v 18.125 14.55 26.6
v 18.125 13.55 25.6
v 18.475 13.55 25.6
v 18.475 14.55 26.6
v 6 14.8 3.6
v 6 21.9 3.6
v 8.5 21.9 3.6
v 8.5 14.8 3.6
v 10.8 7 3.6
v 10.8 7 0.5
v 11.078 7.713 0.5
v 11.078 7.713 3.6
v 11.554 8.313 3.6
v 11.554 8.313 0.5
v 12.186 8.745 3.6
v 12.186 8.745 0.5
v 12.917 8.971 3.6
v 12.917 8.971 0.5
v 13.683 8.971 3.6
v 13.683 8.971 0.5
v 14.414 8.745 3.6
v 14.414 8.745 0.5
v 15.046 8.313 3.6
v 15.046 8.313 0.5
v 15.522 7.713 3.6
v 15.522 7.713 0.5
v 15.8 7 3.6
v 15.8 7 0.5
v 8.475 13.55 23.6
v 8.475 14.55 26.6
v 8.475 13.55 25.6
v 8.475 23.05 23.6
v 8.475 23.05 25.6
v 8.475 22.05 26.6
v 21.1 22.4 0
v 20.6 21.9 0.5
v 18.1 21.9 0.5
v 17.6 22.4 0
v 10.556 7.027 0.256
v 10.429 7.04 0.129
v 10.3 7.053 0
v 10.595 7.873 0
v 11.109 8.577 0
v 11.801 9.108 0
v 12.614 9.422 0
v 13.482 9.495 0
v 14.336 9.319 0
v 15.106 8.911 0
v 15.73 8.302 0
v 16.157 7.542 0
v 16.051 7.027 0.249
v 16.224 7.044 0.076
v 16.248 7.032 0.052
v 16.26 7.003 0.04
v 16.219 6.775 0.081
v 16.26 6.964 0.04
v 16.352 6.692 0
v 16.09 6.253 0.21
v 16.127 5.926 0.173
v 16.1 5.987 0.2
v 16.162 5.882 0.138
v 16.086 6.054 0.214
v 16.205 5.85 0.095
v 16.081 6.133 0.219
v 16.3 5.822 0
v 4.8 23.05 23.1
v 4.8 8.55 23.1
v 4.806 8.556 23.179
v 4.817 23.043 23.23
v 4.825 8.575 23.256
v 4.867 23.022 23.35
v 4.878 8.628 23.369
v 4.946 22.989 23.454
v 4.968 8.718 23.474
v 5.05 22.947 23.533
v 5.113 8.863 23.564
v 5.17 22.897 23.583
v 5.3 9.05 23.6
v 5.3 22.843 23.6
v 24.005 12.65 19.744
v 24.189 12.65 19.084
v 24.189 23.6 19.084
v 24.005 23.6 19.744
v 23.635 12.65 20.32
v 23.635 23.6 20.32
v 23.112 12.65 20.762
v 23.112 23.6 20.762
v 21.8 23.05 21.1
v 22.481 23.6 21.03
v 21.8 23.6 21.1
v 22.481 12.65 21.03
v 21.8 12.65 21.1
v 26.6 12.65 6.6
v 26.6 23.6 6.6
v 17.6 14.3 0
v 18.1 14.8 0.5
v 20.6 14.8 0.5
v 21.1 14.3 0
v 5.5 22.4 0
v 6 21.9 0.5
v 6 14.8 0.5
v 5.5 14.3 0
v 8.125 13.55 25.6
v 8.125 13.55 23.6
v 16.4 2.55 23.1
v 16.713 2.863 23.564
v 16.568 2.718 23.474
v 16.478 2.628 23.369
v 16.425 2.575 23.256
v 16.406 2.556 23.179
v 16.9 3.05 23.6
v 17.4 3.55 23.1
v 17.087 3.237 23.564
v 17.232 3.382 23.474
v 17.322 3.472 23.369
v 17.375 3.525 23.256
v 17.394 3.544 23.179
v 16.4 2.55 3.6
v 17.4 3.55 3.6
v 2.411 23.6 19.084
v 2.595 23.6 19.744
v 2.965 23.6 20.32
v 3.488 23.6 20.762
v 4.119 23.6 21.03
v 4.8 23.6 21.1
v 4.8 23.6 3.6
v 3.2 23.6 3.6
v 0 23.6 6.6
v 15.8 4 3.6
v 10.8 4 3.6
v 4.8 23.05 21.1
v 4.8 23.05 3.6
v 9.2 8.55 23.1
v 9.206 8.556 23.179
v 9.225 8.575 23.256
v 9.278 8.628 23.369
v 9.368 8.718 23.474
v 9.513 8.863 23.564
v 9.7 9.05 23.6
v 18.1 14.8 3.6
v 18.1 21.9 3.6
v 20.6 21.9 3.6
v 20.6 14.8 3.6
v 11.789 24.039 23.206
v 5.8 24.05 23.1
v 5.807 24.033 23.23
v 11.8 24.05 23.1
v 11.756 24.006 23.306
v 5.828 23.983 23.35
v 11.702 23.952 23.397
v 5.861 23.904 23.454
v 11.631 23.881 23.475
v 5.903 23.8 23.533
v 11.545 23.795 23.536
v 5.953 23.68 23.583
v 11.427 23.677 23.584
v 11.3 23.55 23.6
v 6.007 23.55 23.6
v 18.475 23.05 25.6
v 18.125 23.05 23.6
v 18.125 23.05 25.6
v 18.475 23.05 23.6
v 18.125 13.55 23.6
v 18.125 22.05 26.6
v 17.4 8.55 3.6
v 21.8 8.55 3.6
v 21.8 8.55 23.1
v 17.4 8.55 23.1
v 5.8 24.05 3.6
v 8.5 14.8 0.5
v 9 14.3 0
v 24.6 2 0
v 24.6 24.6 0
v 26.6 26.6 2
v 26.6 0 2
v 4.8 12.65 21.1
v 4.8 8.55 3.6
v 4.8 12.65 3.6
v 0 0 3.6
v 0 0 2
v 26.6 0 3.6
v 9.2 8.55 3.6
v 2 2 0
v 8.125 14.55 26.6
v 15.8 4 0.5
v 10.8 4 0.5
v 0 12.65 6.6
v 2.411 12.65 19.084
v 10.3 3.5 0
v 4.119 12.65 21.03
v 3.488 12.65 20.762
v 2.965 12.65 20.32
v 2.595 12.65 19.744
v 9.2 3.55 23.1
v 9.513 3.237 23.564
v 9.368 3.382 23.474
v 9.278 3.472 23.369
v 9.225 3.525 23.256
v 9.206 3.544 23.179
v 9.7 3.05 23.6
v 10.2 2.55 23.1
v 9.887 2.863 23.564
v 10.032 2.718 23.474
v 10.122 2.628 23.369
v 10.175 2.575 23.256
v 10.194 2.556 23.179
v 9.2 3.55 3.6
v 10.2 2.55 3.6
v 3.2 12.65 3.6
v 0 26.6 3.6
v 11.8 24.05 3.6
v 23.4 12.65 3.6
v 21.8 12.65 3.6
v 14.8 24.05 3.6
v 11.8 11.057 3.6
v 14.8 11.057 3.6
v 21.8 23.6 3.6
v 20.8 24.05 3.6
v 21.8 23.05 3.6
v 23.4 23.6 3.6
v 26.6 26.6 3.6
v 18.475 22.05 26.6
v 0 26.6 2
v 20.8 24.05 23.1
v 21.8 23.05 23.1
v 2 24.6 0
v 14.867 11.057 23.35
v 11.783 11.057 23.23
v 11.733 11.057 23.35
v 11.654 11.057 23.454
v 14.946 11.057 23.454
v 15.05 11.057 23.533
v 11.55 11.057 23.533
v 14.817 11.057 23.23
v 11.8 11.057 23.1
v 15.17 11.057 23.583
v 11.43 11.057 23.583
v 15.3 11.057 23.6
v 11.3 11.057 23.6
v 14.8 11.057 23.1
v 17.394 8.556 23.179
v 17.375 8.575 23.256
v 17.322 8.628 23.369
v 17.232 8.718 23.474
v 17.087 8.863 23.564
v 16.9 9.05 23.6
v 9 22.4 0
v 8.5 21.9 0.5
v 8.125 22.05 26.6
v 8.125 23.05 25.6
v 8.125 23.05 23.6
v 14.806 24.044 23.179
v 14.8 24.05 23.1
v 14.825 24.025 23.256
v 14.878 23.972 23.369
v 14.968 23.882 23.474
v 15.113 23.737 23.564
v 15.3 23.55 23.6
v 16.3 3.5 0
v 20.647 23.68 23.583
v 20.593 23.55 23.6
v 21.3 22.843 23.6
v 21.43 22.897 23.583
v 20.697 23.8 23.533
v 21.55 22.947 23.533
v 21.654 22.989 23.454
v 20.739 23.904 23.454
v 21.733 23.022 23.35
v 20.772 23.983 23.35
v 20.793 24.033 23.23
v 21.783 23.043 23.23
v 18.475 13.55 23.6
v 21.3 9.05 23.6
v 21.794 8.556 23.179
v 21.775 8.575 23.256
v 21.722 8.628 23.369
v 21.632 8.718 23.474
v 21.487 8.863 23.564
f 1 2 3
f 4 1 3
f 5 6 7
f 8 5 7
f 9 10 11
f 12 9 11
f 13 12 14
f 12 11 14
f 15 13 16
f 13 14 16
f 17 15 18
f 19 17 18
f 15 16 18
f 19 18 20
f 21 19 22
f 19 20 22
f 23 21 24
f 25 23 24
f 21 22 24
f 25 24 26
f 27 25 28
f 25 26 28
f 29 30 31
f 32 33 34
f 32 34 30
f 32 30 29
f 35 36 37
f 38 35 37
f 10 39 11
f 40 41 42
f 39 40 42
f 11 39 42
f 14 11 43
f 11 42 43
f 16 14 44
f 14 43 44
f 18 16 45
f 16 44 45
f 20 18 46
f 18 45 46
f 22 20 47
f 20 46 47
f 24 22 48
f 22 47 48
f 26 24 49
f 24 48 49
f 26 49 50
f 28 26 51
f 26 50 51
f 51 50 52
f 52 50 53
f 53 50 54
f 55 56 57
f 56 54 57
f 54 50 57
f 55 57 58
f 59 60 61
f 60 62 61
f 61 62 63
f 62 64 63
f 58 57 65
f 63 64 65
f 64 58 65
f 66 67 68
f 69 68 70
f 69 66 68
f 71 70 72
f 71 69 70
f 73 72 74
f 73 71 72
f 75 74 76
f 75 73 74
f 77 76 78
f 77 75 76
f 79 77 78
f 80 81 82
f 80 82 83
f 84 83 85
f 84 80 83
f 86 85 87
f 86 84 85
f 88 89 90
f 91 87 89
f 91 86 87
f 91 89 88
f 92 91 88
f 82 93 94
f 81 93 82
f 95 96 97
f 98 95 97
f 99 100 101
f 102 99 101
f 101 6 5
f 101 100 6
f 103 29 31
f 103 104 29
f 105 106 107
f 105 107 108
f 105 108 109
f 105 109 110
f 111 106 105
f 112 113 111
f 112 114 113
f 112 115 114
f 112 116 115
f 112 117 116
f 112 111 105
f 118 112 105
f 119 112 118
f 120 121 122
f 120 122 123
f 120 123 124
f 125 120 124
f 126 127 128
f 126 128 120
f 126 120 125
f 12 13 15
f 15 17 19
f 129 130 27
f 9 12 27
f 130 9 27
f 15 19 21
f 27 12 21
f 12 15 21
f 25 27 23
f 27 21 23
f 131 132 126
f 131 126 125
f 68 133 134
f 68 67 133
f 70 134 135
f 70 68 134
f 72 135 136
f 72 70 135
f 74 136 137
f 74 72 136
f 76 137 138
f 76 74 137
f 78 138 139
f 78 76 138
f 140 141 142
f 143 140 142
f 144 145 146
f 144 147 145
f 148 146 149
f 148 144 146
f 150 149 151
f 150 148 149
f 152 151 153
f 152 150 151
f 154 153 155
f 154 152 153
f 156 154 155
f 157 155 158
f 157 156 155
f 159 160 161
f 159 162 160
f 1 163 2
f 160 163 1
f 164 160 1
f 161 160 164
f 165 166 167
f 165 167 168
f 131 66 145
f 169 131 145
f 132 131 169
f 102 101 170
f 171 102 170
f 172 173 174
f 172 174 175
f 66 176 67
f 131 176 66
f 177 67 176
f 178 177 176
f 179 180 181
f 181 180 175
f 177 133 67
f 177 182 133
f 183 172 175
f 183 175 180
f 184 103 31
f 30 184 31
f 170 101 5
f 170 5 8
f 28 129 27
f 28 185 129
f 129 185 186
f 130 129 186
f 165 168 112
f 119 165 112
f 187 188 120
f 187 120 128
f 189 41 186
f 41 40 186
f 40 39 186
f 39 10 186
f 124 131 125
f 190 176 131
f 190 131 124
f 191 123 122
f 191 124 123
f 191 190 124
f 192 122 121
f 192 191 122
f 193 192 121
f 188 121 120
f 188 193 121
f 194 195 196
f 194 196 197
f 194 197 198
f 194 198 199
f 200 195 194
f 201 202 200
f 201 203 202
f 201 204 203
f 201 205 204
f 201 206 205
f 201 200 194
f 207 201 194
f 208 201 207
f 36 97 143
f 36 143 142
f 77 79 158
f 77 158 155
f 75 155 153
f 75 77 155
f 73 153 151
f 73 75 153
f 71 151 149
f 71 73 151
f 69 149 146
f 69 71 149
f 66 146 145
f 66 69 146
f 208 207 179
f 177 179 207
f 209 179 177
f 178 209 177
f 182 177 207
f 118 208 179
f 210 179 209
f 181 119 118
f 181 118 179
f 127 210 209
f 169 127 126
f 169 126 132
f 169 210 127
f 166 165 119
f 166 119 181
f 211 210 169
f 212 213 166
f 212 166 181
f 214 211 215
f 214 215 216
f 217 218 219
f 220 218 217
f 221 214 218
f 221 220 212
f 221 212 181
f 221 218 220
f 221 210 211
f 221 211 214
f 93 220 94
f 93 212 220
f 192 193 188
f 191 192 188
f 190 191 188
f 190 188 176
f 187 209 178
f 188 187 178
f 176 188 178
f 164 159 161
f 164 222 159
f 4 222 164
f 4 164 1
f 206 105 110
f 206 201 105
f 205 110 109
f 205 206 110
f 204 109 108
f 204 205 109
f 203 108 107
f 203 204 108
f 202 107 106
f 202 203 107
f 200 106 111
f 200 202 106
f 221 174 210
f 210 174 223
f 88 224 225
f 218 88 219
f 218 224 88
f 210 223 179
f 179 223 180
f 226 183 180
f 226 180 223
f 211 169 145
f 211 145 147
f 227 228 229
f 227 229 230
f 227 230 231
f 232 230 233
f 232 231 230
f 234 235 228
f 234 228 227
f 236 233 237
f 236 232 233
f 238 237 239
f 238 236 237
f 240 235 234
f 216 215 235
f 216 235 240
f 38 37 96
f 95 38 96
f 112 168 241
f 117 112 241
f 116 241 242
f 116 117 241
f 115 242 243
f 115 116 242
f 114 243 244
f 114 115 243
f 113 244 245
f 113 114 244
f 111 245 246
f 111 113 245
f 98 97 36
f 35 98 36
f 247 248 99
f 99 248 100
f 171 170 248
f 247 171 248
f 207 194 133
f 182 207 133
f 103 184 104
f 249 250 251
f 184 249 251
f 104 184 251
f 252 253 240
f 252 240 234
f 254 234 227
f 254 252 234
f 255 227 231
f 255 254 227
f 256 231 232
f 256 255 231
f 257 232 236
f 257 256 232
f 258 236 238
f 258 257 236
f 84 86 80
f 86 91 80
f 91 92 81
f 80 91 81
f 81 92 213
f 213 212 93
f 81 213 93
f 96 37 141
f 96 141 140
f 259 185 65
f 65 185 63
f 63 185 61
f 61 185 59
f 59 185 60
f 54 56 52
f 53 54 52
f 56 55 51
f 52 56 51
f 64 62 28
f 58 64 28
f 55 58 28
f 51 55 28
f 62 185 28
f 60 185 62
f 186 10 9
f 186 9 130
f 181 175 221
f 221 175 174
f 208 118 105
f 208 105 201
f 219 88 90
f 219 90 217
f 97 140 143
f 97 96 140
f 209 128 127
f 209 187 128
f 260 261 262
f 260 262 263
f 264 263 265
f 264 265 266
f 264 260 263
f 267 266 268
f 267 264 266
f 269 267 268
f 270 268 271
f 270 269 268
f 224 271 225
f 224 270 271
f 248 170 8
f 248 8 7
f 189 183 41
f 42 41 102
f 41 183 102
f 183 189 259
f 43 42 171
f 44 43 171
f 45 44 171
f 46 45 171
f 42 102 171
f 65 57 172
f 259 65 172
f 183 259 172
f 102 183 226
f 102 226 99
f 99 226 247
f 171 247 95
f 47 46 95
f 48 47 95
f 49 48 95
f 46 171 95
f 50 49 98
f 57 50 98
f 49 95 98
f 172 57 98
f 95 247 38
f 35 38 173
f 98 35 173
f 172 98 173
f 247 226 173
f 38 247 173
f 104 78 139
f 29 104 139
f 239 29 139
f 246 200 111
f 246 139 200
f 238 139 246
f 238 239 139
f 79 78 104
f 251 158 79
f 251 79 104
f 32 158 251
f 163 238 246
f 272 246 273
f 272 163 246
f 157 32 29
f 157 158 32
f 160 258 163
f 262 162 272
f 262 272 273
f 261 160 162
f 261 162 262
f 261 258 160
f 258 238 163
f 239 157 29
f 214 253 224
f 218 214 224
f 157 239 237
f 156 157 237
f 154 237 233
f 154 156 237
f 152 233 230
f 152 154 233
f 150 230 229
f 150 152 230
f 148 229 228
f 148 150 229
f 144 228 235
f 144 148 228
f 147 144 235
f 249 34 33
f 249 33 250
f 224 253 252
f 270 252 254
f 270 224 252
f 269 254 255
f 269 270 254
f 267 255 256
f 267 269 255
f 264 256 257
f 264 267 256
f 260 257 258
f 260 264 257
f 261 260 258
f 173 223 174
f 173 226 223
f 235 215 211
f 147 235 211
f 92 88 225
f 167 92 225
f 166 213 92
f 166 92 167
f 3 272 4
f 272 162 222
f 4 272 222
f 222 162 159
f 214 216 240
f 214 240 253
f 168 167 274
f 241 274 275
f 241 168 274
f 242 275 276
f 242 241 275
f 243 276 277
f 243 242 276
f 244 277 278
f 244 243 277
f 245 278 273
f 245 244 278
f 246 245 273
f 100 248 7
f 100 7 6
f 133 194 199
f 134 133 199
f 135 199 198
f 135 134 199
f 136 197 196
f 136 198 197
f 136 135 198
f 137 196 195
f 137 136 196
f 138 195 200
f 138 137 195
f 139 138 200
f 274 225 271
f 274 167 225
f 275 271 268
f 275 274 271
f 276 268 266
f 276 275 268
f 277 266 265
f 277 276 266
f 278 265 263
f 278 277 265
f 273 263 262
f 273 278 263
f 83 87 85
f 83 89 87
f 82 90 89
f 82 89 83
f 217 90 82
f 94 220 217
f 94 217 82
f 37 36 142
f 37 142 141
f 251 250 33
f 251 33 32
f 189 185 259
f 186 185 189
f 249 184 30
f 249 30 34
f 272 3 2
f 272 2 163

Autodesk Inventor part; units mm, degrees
ref_plane "XYPlane" through (14.8, 16.3, 3.6) normal (0, 1, 0) x (1, 0, 0)
ref_plane "YZPlane" through (13.3, 11.0574, 3.6) normal (-1, 0, 0) x (0, 0, 1)
sketch "Sketch1" plane through (0, 0, 0) normal (0, 0, 1) x (1, 0, 0)
  line L0 (0, 0) -> (26.6, 0)
  line L1 (26.6, 0) -> (26.6, 26.6)
  line L2 (26.6, 26.6) -> (0, 26.6)
  line L3 (0, 26.6) -> (0, 0)
  dimension "d0" = 26.6
  dimension "d1" = 26.6
extrude "Extrusion1" add sketch "Sketch1" along normal blind 3.6
chamfer "Chamfer1" distance 2 angle 45 4 edges at (13.3, 26.6, 0) (0, 13.3, 0) (26.6, 13.3, 0) (13.3, 0, 0)
sketch "Sketch2" plane through (0, 0, 0) normal (0, 0, -1) x (-1, 0, 0)
  line L0 (0, 26.6) -> (0, 0) construction
  line L1 (0, 20.5614) -> (-6, 20.5614) construction
  line L2 (-26.6, 26.6) -> (0, 26.6) construction
  line L3 (-7.1317, 26.6) -> (-7.1317, 21.9) construction
  line L4 (-7.1317, 26.6) -> (-2.4317, 26.6) construction
  line L5 (-6, 21.9) -> (-8.5, 21.9) construction
  line L6 (-8.5, 21.9) -> (-8.5, 14.8) construction
  line L7 (-8.5, 14.8) -> (-6, 14.8) construction
  line L8 (-6, 14.8) -> (-6, 21.9) construction
  line L9 (-13.3, 26.6) -> (-13.3, 0) construction
  line L10 (0, 0) -> (-26.6, 0) construction
  line L11 (-20.6, 21.9) -> (-18.1, 21.9) construction
  line L12 (-18.1, 21.9) -> (-18.1, 14.8) construction
  line L13 (-18.1, 14.8) -> (-20.6, 14.8) construction
  line L14 (-20.6, 14.8) -> (-20.6, 21.9) construction
  line L15 (-13.3, 0) -> (-13.3, 4) construction
  line L16 (-13.3, 4) -> (-10.8, 4) construction
  line L17 (-10.8, 4) -> (-15.8, 4) construction
  line L18 (-15.8, 4) -> (-15.8, 9) construction
  line L19 (-15.8, 9) -> (-10.8, 9) construction
  line L20 (-10.8, 9) -> (-10.8, 4) construction
  line L21 (-15.8, 4) -> (-15.8, 7) construction
  line L22 (-10.8, 4) -> (-10.8, 7) construction
  arc A0 (-10.8, 7) -> (-15.8, 7) centre (-13.3, 6.4375) ccw construction
  line L23 (-20.6, 21.9) -> (-18.1, 21.9)
  line L24 (-18.1, 21.9) -> (-18.1, 14.8)
  line L25 (-18.1, 14.8) -> (-20.6, 14.8)
  line L26 (-20.6, 14.8) -> (-20.6, 21.9)
  line L27 (-8.5, 21.9) -> (-6, 21.9)
  line L28 (-6, 21.9) -> (-6, 14.8)
  line L29 (-6, 14.8) -> (-8.5, 14.8)
  line L30 (-8.5, 14.8) -> (-8.5, 21.9)
  line L31 (-15.8, 4) -> (-10.8, 4)
  line L32 (-10.8, 7) -> (-10.8, 4)
  line L33 (-15.8, 4) -> (-15.8, 7)
  arc A1 (-10.8, 7) -> (-15.8, 7) centre (-13.3, 6.4375) ccw
  dimension "d7" = 6
  dimension "d9" = 4.7
  dimension "d11" = 2.5
  dimension "d12" = 7.1
  dimension "d13" = 4
  dimension "d14" = 2.5
  dimension "d15" = 5
  dimension "d16" = 5
  dimension "d17" = 3
extrude "Extrusion2" cut sketch "Sketch2" against normal blind 3.6
sketch "Sketch3" plane through (0, 0, 3.6) normal (0, 0, 1) x (1, 0, 0)
  line L0 (15.8, 4) -> (10.8, 4) construction
  line L1 (10.8, 4) -> (10.8, 7) construction
  arc A0 (15.8, 7) -> (10.8, 7) centre (13.3, 6.4375) ccw construction
  line L2 (15.8, 7) -> (15.8, 4) construction
  line L3 (6, 14.8) -> (6, 21.9) construction
  line L4 (6, 21.9) -> (8.5, 21.9) construction
  line L5 (8.5, 21.9) -> (8.5, 14.8) construction
  line L6 (8.5, 14.8) -> (6, 14.8) construction
  line L7 (18.1, 14.8) -> (18.1, 21.9) construction
  line L8 (18.1, 21.9) -> (20.6, 21.9) construction
  line L9 (20.6, 21.9) -> (20.6, 14.8) construction
  line L10 (20.6, 14.8) -> (18.1, 14.8) construction
  line L11 (26.6, 0) -> (26.6, 26.6) construction
  line L12 (26.6, 26.6) -> (0, 26.6) construction
  line L13 (0, 26.6) -> (0, 0) construction
  line L14 (0, 0) -> (26.6, 0) construction
  line L15 (13.3, 26.6) -> (13.3, 0) construction
  line L16 (4.8, 2.55) -> (21.8, 2.55) construction
  line L17 (21.8, 2.55) -> (21.8, 24.05) construction
  line L18 (21.8, 24.05) -> (4.8, 24.05) construction
  line L19 (4.8, 24.05) -> (4.8, 2.55) construction
  line L20 (4.8, 2.55) -> (21.8, 24.05) construction
  line L21 (21.8, 2.55) -> (4.8, 24.05) construction
  line L22 (21.8, 2.55) -> (17.4, 2.55) construction
  line L23 (17.4, 2.55) -> (17.4, 8.55) construction
  line L24 (17.4, 8.55) -> (21.8, 8.55) construction
  line L25 (21.8, 8.55) -> (21.8, 2.55) construction
  line L26 (4.8, 2.55) -> (9.2, 2.55) construction
  line L27 (9.2, 2.55) -> (9.2, 8.55) construction
  line L28 (9.2, 8.55) -> (4.8, 8.55) construction
  line L29 (4.8, 8.55) -> (4.8, 2.55) construction
  line L30 (11.8, 37.0426) -> (14.8, 37.0426) construction
  line L31 (14.8, 37.0426) -> (14.8, 11.0574) construction
  line L32 (14.8, 11.0574) -> (11.8, 11.0574) construction
  line L33 (11.8, 11.0574) -> (11.8, 37.0426) construction
  line L34 (11.8, 37.0426) -> (14.8, 11.0574) construction
  line L35 (14.8, 37.0426) -> (11.8, 11.0574) construction
  line L36 (4.8, 24.05) -> (11.8, 24.05)
  line L37 (11.8, 11.0574) -> (11.8, 24.05)
  line L38 (11.8, 11.0574) -> (14.8, 11.0574)
  line L39 (14.8, 11.0574) -> (14.8, 24.05)
  line L40 (14.8, 24.05) -> (21.8, 24.05)
  line L41 (21.8, 24.05) -> (21.8, 8.55)
  line L42 (21.8, 8.55) -> (17.4, 8.55)
  line L43 (17.4, 8.55) -> (17.4, 2.55)
  line L44 (17.4, 2.55) -> (9.2, 2.55)
  line L45 (9.2, 2.55) -> (9.2, 8.55)
  line L46 (9.2, 8.55) -> (4.8, 8.55)
  line L47 (4.8, 8.55) -> (4.8, 24.05)
  point P0 (13.3, 13.3)
  point P1 (13.3, 24.05)
  dimension "d20" = 17
  dimension "d21" = 21.5
  dimension "d22" = 4.4
  dimension "d23" = 6
  dimension "d24" = 4.4
  dimension "d25" = 6
  dimension "d26" = 3
extrude "Extrusion3" add sketch "Sketch3" along normal blind 20
chamfer "Chamfer2" distance 1 angle 45 4 edges at (4.8, 24.05, 13.6) (21.8, 24.05, 13.6) (17.4, 2.55, 13.6) (9.2, 2.55, 13.6)
fillet "Fillet1" radius 0.5 13 edges at (8.8, 24.05, 23.6) (4.8, 15.8, 23.6) (11.8, 17.5537, 23.6) (14.8, 17.5537, 23.6) (17.8, 24.05, 23.6) (21.8, 15.8, 23.6) (19.6, 8.55, 23.6) (17.4, 6.05, 23.6) (9.2, 6.05, 23.6) (7, 8.55, 23.6) (13.3, 2.55, 23.6) (21.3, 23.55, 23.6) (5.3, 23.55, 23.6)
sketch "Sketch4" plane through (14.8, 16.3, 3.6) normal (0, 1, 0) x (1, 0, 0)
  line L0 (-10, 0) -> (-10, -19.5) construction
  line L1 (11.8, 0) -> (-14.8, 0) construction
  line L2 (-8.7929, -20) -> (-3.5, -20) construction
  arc A0 (-3.5, -20) -> (-3, -19.5) centre (-3.5, -19.5) ccw construction
  line L3 (-3, -19.5) -> (-9, -19.5) construction
  ellipse E0 centre (-8.7929, -19.5) end of major axis (-8.7929, -20) minor radius 0.2071 (-9, -19.5) -> (-8.7929, -20) ccw construction
  line L4 (-9.5, -20) -> (-8.7929, -20) construction
  ellipse E1 centre (-8.7929, -19.5) end of major axis (-8.7929, -20) minor radius 0.2071 (-9, -19.5) -> (-8.7929, -20) ccw construction
  line L5 (-9, -19.5) -> (-10, -19.5) construction
  arc A1 (-10, -19.5) -> (-9.5, -20) centre (-9.5, -19.5) ccw construction
  line L6 (-7.8516, -20) -> (-7.8516, -17.5) construction
  line L7 (-7.8516, -17.5) -> (-16.9269, -17.5) construction
  line L8 (-10, -3.8087) -> (-15, -3.8087) construction
  line L9 (-14.8, 0) -> (-14.8, -3) construction
  line L10 (-10, 0) -> (-11.6, 0) construction
  line L11 (-11.6, 0) -> (-14.8, -3) construction
  line L12 (-10, -17.5) -> (-12, -17.5) construction
  line L13 (-12, -17.5) -> (-14.8, -3) construction
  arc A2 (-12.3892, -15.4843) -> (-10, -17.5) centre (-10.1078, -15.204) ccw construction
  arc A3 (-12.3892, -15.4843) -> (-10, -17.5) centre (-10.1078, -15.204) ccw
  line L14 (-12.3892, -15.4843) -> (-14.8, -3)
  line L15 (-14.8, -3) -> (-11.6, 0)
  line L16 (-11.6, 0) -> (-10, 0)
  line L17 (-10, 0) -> (-10, -17.5)
  point P0 (-14.8, 3.6)
  dimension "d33" = 2.5
  dimension "d34" = 5
  dimension "d35" = 3
  dimension "d36" = 1.6
  dimension "d37" = 2
extrude "Extrusion4" add sketch "Sketch4" along normal blind 7.3 and the other way blind 3.65
mirror "Mirror1" about plane through (13.3, 11.0574, 3.6) normal (-1, 0, 0) of "Extrusion4"
ref_plane "LeftLine" through (8.3, 11.0574, 3.6) normal (1, 0, 0) x (0, 0, -1)
sketch "Sketch5" plane through (8.3, 11.0574, 3.6) normal (1, 0, 0) x (0, 0, -1)
  line L0 (-20, -2.0074) -> (-20, 11.7855) construction
  line L1 (-19.5, 12.9926) -> (0, 12.9926) construction
  line L2 (-20, 11.7855) -> (-20, 12.4926) construction
  line L3 (0, -2.5074) -> (-19.5, -2.5074) construction
  line L4 (-20, 12.9926) -> (-13.6632, 12.9926) construction
  line L5 (-13.6632, 12.9926) -> (-13.6632, -2.5074) construction
  line L6 (-13.6632, -2.5074) -> (-20, -2.5074) construction
  line L7 (-20, -2.5074) -> (-20, 12.9926) construction
  line L8 (-20, 12.9926) -> (-20, 11.9926) construction
  line L9 (-20, -2.5074) -> (-20, 2.4926) construction
  line L10 (-20, 2.4926) -> (-23, 2.4926) construction
  line L11 (-23, 2.4926) -> (-23, 11.9926) construction
  line L12 (-23, 11.9926) -> (-20, 11.9926) construction
  line L13 (-20, 11.9926) -> (-20, 2.4926) construction
  line L14 (-23, 11.9926) -> (-20, 11.9926)
  line L15 (-20, 11.9926) -> (-20, 2.4926)
  line L16 (-20, 2.4926) -> (-23, 2.4926)
  line L17 (-23, 2.4926) -> (-23, 11.9926)
  point P0 (3.6, -11.0574)
  dimension "d42" = 1
  dimension "d43" = 5
  dimension "d44" = 3
extrude "Extrusion5" add sketch "Sketch5" along normal mid plane 0.35
chamfer "Chamfer3" distance 1 angle 45 2 edges at (8.3, 23.05, 26.6) (8.3, 13.55, 26.6)
mirror "Mirror2" about plane through (13.3, 11.0574, 3.6) normal (-1, 0, 0) of "Extrusion5", "Chamfer3"
chamfer "Chamfer4" distance 0.5 angle 45 12 edges at (19.35, 21.9, 0) (18.1, 18.35, 0) (20.6, 18.35, 0) (19.35, 14.8, 0) (7.25, 14.8, 0) (6, 18.35, 0) (7.25, 21.9, 0) (8.5, 18.35, 0) (13.3, 9, 0) (15.8, 5.5, 0) (10.8, 5.5, 0) (13.3, 4, 0)
properties part number "Plug"
